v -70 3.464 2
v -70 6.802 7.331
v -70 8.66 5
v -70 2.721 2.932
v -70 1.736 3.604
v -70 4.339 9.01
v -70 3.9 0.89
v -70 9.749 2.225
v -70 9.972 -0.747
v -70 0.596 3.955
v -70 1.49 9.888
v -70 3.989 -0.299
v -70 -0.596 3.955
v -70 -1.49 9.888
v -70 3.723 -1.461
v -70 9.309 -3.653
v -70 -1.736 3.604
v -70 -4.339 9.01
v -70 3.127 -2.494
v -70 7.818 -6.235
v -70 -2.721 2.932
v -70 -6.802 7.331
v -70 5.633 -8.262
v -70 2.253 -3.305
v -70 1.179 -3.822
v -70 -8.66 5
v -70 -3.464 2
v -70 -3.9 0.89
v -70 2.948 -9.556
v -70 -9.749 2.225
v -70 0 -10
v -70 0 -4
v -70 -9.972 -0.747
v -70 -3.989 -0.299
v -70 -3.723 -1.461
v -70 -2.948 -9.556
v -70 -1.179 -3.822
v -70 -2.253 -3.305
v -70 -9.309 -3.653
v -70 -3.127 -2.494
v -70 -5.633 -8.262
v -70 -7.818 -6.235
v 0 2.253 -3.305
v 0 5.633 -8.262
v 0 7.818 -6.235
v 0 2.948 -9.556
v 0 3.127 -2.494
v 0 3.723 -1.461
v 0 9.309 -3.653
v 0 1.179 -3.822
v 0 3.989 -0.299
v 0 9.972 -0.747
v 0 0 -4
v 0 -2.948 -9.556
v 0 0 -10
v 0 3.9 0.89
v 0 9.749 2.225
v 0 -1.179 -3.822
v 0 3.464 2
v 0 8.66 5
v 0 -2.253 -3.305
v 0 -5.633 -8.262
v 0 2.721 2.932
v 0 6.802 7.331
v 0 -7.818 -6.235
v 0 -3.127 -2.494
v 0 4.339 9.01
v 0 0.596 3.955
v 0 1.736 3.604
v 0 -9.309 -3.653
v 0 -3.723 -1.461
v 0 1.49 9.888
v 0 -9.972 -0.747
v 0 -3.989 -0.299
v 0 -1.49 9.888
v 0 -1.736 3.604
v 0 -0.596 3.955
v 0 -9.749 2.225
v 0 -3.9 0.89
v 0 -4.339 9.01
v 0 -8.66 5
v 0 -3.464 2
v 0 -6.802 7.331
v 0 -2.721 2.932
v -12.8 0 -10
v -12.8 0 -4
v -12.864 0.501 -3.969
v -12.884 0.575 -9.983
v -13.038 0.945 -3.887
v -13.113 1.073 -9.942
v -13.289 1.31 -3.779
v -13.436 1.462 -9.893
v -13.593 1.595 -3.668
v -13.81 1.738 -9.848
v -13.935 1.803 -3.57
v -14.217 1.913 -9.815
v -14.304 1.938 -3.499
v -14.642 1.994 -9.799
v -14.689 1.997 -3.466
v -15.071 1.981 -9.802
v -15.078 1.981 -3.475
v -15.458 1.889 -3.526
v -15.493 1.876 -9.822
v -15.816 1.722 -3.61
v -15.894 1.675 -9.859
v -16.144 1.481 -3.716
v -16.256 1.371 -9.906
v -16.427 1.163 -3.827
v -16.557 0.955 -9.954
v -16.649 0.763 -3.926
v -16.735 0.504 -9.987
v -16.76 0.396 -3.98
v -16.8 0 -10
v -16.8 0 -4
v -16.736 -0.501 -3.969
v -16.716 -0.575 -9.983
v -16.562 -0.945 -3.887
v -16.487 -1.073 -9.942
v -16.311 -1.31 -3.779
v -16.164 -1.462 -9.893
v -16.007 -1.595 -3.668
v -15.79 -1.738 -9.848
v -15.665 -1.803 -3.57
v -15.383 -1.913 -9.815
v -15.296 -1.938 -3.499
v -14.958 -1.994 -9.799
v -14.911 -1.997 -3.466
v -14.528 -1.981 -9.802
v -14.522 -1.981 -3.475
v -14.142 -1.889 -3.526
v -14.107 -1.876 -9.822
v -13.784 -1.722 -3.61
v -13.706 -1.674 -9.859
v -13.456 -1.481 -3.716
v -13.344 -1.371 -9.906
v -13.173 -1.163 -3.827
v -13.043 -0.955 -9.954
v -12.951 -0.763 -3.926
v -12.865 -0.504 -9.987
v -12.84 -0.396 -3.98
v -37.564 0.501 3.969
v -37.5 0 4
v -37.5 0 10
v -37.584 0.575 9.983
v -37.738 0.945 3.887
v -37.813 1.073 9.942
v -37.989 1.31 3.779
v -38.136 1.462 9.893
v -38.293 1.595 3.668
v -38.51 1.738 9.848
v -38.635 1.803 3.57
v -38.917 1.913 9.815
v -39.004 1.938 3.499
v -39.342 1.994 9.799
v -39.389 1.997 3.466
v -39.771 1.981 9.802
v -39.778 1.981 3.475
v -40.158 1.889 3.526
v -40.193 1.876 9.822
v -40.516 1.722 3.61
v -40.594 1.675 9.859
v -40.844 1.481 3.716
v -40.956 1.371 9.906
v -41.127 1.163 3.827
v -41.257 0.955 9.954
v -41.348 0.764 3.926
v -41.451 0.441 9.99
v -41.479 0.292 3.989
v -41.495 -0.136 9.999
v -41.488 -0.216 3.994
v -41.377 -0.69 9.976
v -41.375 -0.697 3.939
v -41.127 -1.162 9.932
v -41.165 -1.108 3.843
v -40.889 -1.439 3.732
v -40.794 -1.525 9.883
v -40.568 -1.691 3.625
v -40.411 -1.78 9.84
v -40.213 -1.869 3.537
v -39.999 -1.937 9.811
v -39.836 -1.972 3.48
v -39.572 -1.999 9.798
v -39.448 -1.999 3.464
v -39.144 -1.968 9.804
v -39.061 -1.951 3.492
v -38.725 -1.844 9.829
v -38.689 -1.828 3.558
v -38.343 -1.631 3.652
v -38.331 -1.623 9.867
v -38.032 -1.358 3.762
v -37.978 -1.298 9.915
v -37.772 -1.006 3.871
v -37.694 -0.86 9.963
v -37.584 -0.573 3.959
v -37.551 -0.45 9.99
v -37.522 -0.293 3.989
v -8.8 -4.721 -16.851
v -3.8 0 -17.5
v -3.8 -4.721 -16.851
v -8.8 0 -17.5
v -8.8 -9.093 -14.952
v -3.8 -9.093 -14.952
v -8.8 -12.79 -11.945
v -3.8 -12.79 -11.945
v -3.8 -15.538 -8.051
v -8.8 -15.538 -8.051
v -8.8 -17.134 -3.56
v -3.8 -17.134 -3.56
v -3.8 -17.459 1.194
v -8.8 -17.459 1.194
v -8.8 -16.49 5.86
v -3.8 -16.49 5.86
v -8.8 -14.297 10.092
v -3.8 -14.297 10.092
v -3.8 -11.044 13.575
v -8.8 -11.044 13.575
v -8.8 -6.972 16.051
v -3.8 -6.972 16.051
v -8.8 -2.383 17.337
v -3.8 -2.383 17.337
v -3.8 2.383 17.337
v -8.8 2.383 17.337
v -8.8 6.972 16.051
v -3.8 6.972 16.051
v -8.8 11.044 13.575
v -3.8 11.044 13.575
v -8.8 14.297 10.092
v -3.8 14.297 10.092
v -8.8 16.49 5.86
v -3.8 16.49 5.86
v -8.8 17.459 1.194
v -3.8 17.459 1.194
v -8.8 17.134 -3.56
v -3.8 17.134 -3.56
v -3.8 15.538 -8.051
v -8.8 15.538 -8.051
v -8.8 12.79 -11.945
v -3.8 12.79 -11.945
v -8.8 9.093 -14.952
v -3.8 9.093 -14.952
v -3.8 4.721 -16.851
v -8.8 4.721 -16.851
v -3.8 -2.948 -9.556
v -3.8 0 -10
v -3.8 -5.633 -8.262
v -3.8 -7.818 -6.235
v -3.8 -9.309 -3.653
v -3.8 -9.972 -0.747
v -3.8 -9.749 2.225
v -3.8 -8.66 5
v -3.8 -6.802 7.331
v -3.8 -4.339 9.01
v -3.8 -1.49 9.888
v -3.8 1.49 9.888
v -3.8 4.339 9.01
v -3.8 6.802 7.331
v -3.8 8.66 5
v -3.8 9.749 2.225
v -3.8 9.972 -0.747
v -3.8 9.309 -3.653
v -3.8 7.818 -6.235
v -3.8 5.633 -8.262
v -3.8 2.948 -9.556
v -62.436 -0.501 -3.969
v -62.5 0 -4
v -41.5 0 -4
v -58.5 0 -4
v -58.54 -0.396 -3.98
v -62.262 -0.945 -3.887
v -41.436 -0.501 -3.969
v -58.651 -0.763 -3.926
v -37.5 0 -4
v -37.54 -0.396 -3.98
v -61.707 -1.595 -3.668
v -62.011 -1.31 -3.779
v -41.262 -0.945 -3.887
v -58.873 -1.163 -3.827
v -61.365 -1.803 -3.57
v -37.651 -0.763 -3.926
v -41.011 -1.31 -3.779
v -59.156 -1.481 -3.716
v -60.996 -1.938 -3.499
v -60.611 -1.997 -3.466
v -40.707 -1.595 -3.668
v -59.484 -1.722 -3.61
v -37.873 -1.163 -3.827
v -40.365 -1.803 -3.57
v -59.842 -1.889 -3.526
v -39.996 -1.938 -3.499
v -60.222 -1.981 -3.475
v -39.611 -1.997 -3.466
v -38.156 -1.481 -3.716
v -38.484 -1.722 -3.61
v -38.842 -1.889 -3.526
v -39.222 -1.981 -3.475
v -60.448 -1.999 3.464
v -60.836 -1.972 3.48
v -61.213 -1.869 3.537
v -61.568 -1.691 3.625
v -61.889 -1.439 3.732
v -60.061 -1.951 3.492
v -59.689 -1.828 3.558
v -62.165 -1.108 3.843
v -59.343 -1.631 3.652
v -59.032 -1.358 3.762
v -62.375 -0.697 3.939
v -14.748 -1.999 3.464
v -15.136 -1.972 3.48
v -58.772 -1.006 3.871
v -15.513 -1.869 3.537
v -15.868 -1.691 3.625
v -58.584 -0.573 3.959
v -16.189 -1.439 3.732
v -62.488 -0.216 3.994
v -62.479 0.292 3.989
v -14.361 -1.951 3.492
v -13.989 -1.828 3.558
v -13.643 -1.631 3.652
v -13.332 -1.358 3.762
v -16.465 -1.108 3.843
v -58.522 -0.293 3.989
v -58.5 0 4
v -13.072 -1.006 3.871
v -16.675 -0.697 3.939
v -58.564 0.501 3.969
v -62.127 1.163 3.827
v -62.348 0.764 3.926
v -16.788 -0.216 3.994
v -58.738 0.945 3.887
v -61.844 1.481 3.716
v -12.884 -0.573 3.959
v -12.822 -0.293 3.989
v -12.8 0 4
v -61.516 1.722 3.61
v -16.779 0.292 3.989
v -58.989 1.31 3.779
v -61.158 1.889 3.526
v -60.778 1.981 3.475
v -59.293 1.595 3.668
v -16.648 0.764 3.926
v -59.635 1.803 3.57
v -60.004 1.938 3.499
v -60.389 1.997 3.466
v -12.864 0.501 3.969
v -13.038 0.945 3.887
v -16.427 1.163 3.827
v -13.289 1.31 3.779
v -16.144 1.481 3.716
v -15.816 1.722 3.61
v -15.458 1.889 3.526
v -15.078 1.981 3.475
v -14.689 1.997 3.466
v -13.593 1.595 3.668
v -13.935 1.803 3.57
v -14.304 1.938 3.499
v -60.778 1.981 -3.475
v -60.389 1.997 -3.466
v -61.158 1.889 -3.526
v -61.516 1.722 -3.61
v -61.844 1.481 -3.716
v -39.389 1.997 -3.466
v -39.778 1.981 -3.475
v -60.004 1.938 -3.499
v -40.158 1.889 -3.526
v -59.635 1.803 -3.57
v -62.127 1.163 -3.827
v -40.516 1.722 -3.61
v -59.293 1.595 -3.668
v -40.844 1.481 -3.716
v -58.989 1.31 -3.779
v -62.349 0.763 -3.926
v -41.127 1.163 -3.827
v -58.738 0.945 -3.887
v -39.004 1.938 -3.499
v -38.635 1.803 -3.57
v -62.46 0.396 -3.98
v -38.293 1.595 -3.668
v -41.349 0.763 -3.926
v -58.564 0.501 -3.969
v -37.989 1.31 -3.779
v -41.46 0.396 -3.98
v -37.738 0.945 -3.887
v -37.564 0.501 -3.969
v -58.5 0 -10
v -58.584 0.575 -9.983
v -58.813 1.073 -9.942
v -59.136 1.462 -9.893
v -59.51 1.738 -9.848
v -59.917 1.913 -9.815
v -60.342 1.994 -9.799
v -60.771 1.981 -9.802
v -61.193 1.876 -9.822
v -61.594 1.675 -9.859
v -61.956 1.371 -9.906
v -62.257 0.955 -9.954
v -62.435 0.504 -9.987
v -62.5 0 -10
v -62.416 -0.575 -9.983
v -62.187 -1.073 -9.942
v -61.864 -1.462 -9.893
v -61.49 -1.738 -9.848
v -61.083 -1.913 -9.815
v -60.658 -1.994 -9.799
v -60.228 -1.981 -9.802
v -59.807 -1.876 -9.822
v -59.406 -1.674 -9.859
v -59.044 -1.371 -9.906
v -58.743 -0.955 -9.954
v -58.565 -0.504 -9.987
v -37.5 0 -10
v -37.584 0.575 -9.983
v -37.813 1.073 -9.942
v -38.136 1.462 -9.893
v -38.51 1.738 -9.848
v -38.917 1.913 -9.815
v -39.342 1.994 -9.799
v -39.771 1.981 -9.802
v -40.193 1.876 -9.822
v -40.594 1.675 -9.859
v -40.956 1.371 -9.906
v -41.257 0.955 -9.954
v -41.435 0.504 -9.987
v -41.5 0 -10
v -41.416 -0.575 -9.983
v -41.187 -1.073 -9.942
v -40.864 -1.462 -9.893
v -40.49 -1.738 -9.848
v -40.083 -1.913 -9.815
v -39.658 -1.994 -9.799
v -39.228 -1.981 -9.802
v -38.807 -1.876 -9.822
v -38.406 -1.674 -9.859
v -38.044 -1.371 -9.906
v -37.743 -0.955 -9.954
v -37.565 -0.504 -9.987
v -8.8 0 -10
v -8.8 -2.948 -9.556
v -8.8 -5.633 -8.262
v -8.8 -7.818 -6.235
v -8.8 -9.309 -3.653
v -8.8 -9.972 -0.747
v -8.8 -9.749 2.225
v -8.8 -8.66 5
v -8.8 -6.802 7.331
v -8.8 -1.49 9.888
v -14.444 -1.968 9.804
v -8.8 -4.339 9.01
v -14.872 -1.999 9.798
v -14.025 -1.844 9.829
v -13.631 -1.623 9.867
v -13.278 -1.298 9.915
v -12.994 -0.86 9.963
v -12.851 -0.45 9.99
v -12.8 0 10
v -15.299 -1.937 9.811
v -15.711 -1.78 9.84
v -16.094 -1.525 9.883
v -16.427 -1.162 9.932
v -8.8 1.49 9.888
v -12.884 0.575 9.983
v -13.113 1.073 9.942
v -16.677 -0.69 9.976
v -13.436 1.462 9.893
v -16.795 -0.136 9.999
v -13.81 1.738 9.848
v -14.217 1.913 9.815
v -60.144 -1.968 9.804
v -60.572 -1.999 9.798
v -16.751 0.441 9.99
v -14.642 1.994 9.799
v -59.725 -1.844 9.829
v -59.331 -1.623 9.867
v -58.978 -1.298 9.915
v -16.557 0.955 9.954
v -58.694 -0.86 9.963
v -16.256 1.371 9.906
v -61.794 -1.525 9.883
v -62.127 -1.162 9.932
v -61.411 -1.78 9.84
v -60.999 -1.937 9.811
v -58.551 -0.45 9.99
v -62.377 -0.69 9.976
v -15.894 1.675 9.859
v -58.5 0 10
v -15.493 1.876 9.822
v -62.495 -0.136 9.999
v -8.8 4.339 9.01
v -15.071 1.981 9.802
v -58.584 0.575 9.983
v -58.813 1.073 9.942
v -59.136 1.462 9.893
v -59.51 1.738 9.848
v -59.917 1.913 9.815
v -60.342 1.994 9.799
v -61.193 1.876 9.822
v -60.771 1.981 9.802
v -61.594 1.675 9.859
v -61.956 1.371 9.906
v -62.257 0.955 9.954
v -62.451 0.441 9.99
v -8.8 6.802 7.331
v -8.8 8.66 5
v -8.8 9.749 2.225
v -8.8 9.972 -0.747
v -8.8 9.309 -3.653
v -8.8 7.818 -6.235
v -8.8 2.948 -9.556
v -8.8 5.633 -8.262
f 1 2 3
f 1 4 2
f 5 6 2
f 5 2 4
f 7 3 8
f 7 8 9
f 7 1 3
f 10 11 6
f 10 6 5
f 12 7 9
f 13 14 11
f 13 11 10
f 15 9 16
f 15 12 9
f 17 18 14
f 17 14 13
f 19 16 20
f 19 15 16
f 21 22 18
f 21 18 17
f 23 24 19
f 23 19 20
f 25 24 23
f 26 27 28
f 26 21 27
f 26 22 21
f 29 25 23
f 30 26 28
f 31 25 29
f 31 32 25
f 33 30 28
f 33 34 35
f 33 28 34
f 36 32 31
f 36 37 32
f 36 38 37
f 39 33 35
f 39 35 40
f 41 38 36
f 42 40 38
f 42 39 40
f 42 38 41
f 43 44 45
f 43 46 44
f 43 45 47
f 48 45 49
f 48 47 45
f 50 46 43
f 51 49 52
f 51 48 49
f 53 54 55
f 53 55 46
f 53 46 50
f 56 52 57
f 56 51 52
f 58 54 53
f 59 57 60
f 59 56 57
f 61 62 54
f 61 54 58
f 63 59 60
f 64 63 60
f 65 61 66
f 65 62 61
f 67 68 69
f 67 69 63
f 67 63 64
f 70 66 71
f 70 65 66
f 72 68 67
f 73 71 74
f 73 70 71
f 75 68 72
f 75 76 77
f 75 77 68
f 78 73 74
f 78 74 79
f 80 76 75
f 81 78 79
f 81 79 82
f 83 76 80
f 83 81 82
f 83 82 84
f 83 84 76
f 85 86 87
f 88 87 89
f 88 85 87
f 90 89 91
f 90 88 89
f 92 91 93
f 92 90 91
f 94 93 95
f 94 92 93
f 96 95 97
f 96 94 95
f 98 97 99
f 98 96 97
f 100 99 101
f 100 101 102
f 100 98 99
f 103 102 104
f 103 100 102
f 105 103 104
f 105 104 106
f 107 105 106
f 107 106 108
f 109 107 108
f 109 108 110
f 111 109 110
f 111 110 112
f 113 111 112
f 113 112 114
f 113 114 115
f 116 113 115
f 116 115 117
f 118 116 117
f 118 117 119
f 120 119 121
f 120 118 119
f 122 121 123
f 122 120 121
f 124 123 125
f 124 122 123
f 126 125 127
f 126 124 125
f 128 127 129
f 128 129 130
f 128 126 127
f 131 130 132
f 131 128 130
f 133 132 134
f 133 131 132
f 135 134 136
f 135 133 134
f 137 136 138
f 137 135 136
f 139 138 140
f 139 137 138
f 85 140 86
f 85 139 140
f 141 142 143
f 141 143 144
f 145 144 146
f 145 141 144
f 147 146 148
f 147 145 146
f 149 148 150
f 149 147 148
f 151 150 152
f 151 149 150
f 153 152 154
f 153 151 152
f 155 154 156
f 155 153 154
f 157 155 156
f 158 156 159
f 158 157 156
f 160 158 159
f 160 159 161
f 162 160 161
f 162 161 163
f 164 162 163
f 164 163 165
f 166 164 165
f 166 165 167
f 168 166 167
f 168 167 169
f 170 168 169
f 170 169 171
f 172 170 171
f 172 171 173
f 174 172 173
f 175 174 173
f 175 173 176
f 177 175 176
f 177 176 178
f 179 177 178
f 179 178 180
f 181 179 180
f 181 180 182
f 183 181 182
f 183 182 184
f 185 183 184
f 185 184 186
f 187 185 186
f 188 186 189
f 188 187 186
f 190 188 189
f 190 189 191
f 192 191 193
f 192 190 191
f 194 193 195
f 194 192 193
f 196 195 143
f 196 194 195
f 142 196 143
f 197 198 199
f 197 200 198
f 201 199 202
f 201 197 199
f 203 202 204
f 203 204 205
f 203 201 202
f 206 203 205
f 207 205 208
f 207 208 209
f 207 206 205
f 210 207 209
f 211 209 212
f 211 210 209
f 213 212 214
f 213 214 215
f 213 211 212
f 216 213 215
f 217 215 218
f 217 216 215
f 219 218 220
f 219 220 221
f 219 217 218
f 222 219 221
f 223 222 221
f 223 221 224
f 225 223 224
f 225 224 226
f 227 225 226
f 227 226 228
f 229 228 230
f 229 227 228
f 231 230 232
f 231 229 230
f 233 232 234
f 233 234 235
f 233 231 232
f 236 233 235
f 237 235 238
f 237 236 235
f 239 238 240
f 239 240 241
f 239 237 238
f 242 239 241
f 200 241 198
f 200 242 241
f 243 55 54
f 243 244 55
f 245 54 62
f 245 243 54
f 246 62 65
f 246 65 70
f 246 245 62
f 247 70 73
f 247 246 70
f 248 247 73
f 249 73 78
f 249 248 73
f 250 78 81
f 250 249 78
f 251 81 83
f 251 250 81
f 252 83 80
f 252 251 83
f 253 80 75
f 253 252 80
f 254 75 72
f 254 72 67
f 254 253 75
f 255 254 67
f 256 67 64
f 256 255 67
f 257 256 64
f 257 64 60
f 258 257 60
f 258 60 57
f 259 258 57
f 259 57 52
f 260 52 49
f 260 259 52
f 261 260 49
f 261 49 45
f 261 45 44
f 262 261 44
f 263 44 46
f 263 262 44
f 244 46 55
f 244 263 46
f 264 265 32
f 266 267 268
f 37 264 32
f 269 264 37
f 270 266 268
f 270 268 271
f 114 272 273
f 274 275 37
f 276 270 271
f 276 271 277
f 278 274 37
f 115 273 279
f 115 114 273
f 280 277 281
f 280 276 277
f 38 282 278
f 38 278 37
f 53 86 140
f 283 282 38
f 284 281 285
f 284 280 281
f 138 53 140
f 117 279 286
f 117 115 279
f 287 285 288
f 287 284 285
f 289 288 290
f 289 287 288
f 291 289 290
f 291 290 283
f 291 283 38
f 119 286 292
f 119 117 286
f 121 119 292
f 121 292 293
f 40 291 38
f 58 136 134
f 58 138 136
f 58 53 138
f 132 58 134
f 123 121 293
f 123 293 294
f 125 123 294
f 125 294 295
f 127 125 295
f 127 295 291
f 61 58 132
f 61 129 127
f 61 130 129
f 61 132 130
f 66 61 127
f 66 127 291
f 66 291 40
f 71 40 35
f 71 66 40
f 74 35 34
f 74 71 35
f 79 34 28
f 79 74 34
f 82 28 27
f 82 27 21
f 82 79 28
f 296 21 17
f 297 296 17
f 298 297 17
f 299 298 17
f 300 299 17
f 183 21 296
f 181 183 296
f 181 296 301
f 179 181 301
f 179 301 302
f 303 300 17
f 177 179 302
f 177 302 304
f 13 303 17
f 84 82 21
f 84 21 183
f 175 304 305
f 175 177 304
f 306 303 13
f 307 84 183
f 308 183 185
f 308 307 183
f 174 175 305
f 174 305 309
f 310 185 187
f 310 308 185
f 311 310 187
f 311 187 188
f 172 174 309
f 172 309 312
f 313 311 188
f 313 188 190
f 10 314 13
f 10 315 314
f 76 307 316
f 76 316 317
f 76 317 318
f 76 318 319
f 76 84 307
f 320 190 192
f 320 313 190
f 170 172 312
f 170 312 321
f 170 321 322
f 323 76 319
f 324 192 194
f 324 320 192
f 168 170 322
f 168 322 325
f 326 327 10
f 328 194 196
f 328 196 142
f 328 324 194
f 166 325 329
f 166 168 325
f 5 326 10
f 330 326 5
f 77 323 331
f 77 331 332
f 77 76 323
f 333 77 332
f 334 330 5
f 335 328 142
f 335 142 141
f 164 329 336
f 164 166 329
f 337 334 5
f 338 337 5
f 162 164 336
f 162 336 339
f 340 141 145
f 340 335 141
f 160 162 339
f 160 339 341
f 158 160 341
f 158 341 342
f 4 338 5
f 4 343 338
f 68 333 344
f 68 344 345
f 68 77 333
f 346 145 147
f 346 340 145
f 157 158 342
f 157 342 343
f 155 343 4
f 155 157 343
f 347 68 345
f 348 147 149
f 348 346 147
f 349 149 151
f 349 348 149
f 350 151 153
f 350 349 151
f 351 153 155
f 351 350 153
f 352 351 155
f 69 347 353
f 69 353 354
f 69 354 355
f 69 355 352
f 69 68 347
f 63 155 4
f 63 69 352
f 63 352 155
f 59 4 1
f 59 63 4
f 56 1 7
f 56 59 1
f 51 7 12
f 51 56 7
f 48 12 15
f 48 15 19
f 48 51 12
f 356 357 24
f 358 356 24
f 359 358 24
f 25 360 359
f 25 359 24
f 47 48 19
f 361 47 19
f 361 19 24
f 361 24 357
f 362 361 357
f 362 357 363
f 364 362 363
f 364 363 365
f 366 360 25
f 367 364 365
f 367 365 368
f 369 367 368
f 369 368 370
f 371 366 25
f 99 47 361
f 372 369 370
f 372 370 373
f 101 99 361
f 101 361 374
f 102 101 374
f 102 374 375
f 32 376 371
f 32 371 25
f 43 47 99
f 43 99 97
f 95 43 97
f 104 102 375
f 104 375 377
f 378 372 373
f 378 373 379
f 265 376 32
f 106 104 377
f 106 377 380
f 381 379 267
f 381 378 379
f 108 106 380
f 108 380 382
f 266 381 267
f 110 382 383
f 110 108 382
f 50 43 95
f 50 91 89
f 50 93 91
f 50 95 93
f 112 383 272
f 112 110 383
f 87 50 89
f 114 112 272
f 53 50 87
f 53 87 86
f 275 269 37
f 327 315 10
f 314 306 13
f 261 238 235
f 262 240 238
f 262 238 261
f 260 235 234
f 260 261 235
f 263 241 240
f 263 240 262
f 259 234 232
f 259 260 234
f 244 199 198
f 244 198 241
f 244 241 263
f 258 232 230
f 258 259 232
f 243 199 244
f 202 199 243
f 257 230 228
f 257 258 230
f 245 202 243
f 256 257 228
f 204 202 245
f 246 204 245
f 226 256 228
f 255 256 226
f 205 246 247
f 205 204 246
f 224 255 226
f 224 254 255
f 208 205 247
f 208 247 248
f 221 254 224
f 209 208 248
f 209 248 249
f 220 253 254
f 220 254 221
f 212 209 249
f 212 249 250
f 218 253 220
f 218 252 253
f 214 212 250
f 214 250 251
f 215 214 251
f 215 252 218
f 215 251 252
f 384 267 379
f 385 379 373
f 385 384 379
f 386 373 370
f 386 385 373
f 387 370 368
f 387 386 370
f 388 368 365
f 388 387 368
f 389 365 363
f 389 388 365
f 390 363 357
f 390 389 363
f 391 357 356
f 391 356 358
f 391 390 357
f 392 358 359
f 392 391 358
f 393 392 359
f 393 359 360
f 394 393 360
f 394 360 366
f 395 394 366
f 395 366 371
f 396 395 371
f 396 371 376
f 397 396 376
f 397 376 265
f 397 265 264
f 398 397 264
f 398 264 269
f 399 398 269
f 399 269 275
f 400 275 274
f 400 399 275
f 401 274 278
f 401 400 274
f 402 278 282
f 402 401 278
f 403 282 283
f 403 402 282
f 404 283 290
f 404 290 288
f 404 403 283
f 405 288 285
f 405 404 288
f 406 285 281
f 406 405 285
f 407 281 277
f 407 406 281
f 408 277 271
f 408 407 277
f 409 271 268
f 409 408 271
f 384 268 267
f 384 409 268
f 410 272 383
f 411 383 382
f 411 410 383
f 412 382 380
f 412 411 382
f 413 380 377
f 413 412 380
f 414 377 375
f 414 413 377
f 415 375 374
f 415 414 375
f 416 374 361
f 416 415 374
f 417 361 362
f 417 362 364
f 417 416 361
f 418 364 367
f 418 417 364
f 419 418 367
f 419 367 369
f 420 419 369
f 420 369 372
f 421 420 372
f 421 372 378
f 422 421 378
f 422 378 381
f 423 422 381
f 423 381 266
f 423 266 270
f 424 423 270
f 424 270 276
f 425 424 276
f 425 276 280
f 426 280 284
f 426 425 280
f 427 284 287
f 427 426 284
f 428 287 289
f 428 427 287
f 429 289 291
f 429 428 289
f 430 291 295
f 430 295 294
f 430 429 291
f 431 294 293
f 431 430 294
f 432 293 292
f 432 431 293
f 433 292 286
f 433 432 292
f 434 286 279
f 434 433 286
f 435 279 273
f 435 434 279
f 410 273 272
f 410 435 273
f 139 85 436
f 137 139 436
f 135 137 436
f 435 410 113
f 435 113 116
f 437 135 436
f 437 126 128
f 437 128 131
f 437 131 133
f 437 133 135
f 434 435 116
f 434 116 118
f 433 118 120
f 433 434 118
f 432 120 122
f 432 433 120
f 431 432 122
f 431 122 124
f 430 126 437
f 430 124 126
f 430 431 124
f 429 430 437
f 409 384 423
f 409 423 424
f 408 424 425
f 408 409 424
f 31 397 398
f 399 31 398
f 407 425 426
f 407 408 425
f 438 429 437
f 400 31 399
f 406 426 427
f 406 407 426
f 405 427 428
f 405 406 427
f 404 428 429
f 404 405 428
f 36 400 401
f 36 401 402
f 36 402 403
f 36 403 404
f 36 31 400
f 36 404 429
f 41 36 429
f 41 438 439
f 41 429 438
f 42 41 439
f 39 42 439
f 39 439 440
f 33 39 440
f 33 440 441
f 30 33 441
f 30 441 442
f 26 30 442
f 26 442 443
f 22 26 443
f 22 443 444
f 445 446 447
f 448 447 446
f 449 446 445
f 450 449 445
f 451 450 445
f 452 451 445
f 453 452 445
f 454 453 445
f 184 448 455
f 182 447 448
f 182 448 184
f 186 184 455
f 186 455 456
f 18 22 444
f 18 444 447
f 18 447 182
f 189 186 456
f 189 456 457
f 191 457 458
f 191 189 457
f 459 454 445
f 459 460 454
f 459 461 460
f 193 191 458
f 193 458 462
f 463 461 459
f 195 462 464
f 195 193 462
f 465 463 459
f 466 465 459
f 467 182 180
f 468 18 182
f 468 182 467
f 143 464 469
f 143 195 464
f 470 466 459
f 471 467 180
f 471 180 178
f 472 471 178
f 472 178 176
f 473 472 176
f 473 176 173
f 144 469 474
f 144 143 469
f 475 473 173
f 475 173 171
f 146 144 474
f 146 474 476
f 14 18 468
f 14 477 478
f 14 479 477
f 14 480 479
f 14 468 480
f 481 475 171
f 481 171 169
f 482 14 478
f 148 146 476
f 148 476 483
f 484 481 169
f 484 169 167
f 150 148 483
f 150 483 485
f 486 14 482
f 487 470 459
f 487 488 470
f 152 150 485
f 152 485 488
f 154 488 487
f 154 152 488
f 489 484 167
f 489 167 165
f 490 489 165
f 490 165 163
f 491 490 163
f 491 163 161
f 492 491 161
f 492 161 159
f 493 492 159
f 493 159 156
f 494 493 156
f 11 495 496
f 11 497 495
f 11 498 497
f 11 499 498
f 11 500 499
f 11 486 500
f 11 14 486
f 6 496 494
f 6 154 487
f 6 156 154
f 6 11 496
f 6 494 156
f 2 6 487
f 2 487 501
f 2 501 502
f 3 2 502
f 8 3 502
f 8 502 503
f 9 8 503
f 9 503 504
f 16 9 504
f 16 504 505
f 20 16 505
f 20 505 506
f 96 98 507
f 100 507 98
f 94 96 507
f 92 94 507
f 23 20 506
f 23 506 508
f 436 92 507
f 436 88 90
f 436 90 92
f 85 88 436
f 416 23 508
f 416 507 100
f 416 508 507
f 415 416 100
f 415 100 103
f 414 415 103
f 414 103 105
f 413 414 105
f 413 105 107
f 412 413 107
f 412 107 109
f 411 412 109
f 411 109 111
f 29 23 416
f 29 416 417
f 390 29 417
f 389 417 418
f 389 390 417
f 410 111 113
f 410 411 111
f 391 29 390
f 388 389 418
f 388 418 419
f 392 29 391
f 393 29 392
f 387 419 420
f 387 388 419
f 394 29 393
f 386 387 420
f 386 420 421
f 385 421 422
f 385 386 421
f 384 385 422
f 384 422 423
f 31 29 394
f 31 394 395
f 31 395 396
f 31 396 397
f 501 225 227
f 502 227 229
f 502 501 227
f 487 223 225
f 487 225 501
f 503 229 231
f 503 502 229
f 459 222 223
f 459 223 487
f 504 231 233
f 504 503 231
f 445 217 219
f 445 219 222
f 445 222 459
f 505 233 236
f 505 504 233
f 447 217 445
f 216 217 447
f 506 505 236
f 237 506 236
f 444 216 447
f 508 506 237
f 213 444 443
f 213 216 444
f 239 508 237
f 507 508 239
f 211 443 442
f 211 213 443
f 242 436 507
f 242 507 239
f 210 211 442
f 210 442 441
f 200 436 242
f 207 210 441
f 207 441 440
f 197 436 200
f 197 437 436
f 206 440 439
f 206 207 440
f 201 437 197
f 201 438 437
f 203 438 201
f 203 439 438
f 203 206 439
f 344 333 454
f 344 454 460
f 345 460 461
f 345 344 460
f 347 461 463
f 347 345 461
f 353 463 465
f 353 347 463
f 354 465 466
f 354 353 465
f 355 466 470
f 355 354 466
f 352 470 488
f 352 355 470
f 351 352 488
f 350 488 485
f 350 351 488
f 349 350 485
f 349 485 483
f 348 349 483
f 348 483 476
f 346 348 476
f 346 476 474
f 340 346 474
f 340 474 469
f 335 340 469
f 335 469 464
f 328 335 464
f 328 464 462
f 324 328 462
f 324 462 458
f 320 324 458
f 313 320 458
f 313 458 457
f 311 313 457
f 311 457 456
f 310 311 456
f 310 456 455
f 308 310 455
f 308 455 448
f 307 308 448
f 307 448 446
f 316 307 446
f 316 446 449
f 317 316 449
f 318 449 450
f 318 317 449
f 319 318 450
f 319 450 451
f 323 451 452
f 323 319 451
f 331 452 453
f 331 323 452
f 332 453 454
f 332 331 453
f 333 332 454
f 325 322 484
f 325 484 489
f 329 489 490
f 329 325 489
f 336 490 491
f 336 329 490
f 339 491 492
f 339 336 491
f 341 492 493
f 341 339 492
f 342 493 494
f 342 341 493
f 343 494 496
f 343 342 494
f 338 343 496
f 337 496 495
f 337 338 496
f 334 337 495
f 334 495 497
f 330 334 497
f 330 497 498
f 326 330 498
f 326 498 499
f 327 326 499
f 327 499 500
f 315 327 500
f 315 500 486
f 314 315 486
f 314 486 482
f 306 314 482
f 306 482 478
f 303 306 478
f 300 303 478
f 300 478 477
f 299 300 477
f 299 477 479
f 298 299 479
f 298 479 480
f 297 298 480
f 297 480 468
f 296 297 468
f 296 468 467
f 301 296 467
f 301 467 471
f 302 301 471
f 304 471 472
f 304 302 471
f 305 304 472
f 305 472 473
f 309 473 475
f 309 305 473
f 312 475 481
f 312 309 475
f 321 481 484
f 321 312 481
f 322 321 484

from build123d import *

# Parameters (mm, degrees)
CUT_EXTRUDE2_DEPTH      = 75.246212025
CUT_EXTRUDE2_DEPTH_BACK = 75.246212025
SKETCH5_R               = 2


with BuildPart() as part:
    # Sketch1 → Revolve2 (revolve)
    with BuildSketch(Plane(origin=(0, 0, 0), x_dir=(1, 0, 0), z_dir=(0, 1, 0))):
        Polygon((-3.8, 17.5), (-8.8, 17.5), (-8.8, 10), (-70, 10), (-70, 0), (-70, 4), (0, 4), (0, 10), (-3.8, 10), align=None)
    revolve(axis=Axis((0, 0, 0), (-1, 0, 0)))

    # Sketch5 → Cut-Extrude2 (cut, two sides: drawn at the far end of the back side and taken through both)
    with BuildSketch(Plane.XY.offset(-CUT_EXTRUDE2_DEPTH_BACK)):
        with Locations((-39.5, 0)):
            Circle(SKETCH5_R)
        with Locations((-60.5, 0)):
            Circle(SKETCH5_R)
        with Locations((-14.8, 0)):
            Circle(SKETCH5_R)
    extrude(amount=CUT_EXTRUDE2_DEPTH + CUT_EXTRUDE2_DEPTH_BACK, mode=Mode.SUBTRACT)


solid = part.part
